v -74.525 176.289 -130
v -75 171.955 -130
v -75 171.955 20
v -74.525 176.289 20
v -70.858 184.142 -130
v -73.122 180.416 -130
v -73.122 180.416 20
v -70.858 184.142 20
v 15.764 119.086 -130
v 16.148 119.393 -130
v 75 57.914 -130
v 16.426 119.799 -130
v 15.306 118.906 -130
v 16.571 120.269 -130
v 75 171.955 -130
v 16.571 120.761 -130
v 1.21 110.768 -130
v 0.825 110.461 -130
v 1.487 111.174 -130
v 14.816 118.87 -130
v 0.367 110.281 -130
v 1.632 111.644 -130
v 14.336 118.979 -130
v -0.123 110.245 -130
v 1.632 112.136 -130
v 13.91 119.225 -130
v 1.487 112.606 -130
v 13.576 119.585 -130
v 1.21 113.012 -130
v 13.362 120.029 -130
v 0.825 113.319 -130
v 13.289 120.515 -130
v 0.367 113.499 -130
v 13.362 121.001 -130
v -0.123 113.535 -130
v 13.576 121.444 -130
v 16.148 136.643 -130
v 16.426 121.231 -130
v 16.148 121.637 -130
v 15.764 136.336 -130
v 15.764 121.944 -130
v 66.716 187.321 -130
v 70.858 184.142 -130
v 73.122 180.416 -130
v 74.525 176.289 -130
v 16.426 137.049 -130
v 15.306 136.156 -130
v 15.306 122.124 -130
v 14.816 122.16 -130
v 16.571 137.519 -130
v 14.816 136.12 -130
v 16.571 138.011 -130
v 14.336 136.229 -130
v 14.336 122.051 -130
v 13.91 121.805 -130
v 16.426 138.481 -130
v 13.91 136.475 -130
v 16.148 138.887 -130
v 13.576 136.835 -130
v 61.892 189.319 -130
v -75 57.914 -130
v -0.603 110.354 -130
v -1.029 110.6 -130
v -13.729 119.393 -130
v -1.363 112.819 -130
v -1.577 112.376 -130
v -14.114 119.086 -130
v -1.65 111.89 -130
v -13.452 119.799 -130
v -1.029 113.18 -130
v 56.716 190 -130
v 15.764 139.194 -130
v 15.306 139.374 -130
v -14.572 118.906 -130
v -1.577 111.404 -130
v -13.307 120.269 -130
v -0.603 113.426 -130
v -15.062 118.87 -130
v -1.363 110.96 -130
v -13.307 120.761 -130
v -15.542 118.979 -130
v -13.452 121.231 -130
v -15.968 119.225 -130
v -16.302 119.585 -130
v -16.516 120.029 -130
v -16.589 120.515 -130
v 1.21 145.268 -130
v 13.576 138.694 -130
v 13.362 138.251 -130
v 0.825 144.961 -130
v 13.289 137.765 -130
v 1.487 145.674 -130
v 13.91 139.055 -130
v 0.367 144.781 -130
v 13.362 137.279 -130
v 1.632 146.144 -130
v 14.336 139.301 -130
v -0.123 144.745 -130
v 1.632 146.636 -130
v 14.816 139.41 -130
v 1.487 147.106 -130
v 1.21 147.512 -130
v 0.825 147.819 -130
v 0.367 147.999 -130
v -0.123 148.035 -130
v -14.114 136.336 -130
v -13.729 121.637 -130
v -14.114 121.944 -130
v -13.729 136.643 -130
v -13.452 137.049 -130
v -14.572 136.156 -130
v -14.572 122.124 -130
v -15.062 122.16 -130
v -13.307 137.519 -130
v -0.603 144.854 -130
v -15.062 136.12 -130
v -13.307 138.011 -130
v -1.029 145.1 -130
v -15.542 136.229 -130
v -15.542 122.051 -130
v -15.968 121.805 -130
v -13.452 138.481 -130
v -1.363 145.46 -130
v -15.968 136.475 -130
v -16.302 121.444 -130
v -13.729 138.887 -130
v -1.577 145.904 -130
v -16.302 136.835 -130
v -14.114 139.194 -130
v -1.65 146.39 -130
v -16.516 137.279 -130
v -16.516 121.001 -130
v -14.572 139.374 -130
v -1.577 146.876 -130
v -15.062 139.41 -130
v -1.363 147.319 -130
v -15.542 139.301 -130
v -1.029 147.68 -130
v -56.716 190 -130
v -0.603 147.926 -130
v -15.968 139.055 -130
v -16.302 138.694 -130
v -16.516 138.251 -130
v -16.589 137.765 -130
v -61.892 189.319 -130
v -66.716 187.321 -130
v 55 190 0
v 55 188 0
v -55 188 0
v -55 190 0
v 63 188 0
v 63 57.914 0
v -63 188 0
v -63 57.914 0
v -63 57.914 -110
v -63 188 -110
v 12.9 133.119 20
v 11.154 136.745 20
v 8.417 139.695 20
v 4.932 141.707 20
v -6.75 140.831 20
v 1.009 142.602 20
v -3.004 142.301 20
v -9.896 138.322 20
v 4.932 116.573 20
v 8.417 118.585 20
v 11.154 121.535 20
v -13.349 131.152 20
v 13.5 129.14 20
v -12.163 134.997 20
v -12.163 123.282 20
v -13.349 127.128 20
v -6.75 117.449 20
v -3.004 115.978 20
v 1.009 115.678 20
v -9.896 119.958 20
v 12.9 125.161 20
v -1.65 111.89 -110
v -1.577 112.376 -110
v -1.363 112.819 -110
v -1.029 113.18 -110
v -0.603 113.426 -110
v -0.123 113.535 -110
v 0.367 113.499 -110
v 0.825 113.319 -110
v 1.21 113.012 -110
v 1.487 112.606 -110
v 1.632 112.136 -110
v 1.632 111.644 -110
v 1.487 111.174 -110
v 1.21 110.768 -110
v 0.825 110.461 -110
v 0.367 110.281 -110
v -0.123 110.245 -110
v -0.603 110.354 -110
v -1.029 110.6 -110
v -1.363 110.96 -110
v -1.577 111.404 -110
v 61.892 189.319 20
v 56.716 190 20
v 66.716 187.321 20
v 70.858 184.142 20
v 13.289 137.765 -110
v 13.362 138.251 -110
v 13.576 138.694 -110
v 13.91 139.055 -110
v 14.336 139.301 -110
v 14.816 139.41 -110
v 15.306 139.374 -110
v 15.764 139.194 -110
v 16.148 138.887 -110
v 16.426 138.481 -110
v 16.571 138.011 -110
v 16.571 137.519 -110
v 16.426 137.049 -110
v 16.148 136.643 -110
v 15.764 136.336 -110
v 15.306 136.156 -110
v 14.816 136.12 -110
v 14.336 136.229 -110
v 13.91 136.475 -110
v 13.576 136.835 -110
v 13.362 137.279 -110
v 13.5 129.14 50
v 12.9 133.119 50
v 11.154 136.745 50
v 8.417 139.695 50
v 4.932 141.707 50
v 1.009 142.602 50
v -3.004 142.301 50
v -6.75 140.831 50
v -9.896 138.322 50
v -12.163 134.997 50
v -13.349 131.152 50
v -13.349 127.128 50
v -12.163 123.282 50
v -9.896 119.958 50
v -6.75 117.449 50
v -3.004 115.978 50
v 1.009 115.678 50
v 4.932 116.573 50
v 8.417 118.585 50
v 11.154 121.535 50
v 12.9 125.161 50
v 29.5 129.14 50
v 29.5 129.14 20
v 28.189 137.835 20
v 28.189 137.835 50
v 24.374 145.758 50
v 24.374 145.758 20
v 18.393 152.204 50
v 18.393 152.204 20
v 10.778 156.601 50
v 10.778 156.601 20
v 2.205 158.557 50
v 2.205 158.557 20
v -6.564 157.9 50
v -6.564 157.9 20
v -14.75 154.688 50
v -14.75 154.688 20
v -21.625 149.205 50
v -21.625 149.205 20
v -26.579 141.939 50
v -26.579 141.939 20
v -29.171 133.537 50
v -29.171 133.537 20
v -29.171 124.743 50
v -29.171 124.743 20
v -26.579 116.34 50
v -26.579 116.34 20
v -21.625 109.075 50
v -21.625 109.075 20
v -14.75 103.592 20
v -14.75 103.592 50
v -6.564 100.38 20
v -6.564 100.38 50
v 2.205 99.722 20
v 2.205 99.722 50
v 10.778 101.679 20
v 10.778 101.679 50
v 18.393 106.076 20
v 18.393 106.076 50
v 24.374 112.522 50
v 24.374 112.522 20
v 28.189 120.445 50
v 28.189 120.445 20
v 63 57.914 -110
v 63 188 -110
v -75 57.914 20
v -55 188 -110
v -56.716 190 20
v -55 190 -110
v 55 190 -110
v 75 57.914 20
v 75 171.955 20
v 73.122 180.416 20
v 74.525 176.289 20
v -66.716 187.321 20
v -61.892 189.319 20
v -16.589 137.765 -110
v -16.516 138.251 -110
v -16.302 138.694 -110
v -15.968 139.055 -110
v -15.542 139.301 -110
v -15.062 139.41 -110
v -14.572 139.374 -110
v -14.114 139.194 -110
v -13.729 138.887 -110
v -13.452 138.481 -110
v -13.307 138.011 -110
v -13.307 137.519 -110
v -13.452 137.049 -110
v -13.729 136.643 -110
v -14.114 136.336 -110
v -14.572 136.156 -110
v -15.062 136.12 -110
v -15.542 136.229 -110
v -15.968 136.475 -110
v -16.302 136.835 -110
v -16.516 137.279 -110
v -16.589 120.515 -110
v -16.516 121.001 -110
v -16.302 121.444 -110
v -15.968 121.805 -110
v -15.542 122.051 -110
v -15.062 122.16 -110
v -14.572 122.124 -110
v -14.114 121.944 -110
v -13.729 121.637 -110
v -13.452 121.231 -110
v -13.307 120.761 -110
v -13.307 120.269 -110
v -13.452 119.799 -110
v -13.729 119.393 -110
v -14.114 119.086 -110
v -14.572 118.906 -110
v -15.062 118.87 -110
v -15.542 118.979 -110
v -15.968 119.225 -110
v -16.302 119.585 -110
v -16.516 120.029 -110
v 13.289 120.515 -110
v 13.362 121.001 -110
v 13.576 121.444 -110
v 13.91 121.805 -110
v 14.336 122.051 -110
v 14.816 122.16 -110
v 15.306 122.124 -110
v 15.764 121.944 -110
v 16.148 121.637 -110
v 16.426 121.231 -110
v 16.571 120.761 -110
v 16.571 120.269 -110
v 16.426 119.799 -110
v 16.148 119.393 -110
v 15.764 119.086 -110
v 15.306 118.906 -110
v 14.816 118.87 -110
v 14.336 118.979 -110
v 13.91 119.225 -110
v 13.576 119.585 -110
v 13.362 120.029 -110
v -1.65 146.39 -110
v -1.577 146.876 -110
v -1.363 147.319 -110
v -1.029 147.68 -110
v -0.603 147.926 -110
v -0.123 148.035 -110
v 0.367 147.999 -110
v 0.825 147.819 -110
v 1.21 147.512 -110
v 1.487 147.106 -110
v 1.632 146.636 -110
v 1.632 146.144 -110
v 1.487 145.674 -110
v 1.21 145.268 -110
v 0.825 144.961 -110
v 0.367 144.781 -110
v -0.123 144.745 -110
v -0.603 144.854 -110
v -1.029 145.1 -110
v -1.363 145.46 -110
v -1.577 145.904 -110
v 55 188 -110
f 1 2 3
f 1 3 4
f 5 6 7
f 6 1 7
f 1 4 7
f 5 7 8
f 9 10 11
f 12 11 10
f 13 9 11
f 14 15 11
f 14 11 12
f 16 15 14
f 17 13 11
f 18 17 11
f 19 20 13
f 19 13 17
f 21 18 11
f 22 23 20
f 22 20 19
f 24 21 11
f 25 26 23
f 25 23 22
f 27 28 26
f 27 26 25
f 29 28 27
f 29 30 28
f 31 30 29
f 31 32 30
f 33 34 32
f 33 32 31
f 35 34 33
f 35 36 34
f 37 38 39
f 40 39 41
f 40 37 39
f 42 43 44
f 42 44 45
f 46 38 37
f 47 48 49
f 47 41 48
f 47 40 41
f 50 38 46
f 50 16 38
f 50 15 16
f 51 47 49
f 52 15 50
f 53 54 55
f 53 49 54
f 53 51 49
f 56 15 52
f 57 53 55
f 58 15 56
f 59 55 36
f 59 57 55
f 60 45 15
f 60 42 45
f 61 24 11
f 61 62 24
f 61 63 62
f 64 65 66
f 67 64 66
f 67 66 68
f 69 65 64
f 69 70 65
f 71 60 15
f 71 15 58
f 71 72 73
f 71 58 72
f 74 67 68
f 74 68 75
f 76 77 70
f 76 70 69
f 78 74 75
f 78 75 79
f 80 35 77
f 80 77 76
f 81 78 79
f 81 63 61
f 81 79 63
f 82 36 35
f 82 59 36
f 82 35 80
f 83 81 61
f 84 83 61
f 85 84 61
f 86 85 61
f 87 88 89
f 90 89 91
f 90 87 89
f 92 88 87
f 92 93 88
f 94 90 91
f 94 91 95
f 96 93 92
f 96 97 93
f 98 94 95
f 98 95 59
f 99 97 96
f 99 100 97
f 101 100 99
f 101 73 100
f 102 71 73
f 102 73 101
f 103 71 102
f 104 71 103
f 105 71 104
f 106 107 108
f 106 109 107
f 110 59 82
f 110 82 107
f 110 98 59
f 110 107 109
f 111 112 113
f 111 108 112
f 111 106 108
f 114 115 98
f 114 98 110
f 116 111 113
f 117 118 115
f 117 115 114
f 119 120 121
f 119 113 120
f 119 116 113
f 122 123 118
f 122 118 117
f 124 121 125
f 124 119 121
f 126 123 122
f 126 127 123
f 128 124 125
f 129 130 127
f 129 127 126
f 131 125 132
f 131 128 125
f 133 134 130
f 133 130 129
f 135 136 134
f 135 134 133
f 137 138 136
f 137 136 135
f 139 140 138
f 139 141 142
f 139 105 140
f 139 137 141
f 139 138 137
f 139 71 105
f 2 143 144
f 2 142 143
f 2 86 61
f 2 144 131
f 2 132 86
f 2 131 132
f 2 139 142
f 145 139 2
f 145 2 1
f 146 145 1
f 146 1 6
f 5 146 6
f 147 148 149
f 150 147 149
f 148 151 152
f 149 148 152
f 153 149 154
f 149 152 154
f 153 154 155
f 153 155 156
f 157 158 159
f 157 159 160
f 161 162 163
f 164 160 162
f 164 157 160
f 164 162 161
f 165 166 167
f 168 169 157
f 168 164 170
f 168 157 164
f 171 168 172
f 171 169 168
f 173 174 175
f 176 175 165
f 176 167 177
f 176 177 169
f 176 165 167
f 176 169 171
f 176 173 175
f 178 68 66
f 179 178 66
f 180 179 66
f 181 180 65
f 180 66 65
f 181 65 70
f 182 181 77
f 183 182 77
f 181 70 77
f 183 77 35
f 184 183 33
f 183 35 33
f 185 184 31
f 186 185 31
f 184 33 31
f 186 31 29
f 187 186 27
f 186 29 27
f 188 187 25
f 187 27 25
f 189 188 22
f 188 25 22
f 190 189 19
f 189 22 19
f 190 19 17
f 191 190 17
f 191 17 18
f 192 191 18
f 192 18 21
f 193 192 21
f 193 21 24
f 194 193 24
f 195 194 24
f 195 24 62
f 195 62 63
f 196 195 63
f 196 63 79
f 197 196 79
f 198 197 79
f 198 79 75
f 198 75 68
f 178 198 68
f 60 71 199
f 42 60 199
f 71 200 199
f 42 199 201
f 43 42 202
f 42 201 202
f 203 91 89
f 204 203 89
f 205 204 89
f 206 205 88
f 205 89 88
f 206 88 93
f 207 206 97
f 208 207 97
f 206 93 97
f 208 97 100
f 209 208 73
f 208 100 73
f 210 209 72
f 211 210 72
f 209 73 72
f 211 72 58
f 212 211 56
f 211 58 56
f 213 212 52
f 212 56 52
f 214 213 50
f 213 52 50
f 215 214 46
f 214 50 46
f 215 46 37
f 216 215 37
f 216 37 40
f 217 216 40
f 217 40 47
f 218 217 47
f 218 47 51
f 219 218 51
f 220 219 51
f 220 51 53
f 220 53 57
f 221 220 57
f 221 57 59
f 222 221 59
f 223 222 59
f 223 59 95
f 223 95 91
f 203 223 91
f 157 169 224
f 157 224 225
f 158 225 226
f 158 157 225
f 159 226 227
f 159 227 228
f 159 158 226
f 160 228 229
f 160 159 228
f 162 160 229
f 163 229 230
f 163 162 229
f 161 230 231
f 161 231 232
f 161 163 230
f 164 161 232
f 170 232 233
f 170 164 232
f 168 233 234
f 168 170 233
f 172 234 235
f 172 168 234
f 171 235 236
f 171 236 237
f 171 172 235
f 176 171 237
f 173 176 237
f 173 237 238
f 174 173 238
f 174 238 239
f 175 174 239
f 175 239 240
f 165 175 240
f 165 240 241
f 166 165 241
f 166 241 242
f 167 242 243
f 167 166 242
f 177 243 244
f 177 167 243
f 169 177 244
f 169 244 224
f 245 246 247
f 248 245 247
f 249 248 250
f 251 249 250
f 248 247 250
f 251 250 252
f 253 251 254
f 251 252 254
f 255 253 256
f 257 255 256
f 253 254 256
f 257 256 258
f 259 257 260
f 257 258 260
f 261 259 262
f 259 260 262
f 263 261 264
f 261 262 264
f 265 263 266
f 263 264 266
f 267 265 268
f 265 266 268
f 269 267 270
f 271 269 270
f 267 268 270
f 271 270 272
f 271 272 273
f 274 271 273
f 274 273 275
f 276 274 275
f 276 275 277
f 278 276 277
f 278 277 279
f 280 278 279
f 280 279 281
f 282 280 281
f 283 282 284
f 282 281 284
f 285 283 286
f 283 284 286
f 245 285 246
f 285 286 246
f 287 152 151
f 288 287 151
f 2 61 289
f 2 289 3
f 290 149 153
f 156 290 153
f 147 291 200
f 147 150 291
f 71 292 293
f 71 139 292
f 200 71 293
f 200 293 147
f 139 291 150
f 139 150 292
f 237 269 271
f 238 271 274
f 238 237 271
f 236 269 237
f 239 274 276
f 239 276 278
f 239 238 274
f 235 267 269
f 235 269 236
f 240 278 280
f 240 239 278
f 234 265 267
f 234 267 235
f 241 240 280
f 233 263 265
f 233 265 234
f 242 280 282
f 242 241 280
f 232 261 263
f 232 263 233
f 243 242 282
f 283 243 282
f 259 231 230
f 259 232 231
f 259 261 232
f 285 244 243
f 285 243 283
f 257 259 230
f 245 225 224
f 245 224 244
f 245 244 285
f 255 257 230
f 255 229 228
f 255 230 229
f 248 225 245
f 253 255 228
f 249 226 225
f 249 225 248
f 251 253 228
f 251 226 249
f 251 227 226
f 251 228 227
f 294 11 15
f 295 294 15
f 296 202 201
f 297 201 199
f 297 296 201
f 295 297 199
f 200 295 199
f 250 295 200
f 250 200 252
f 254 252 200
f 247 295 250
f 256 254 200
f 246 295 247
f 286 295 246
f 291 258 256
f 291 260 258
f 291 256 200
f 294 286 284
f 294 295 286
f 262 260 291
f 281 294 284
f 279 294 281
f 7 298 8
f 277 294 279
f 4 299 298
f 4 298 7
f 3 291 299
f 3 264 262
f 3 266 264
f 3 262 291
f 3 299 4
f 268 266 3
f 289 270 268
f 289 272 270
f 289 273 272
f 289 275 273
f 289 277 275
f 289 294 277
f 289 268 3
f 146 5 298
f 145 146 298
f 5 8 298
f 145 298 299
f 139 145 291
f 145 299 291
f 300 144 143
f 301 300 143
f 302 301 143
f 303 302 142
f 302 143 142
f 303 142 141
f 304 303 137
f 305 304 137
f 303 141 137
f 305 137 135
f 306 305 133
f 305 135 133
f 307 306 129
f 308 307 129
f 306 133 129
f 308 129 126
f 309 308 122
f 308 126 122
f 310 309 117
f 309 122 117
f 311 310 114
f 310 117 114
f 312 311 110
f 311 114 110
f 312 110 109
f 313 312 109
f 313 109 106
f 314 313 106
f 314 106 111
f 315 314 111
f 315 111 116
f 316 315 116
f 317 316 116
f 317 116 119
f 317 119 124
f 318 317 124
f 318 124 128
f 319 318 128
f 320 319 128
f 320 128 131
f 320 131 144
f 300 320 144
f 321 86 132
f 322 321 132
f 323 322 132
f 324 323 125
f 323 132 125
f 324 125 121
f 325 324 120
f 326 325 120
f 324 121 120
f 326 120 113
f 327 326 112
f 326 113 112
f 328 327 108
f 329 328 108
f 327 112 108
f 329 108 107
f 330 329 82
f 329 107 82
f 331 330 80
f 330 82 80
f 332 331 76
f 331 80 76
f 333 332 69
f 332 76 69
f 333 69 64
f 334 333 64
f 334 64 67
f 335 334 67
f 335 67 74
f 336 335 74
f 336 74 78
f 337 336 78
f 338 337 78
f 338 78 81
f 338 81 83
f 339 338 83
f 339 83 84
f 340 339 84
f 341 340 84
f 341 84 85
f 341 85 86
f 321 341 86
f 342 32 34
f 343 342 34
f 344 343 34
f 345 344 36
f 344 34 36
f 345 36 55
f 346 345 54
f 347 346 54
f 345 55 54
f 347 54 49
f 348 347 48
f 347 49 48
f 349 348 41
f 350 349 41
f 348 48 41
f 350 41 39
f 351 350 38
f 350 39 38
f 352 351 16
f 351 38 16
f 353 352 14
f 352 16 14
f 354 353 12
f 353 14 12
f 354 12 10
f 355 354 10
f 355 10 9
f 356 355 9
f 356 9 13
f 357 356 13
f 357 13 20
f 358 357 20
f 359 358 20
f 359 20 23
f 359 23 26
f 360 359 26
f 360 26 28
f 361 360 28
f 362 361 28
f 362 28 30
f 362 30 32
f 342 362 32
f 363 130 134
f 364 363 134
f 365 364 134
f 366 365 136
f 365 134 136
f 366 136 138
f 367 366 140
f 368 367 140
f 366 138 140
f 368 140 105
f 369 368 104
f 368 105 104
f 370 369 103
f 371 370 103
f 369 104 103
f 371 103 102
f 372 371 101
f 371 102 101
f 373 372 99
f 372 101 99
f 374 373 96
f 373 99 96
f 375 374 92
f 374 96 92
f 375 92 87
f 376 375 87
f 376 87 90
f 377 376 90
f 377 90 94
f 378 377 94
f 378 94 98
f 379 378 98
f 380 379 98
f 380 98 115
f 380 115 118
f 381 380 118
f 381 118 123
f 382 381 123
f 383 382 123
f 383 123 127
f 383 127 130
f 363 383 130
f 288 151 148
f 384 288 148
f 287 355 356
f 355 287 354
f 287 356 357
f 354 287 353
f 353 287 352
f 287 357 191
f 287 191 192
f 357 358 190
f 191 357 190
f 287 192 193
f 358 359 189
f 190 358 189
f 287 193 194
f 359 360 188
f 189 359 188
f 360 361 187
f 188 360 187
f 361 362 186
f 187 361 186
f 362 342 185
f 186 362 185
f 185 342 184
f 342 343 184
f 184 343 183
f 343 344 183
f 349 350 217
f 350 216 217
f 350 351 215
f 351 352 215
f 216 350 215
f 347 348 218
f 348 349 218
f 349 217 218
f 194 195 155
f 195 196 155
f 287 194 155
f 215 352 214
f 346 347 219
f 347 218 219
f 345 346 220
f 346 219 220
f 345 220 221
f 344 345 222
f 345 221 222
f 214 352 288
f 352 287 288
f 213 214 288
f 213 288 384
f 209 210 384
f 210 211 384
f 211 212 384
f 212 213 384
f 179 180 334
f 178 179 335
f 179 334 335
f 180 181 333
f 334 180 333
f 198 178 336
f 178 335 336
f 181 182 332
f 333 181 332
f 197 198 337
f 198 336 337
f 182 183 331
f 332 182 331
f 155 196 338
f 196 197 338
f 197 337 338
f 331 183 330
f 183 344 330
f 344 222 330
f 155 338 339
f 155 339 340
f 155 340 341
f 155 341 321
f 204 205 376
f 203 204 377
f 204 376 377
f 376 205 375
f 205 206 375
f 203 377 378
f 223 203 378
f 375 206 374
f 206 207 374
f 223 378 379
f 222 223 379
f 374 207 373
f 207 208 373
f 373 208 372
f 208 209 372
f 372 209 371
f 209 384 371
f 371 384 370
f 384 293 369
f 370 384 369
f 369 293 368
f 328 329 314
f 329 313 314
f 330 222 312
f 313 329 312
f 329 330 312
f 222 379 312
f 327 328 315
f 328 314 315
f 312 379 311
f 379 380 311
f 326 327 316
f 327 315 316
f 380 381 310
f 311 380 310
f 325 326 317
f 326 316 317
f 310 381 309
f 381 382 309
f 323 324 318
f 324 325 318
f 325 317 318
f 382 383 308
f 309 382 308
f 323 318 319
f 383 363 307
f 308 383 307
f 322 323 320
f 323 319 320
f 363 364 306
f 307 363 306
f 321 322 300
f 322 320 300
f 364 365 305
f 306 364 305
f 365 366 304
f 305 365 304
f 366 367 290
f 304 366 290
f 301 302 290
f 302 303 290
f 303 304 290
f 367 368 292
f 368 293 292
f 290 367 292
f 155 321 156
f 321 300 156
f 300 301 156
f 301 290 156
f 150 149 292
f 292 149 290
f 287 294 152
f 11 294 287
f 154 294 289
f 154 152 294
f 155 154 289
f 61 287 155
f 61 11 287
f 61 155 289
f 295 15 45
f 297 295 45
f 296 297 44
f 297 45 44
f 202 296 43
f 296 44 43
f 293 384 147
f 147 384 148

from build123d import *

# Parameters (mm, degrees)
EXTRUDE_1_OUTLINE_W             = 150
EXTRUDE_1_OUTLINE_H             = 400
EXTRUDE_1_OUTLINE_R             = 48.25
EXTRUDE_1_DEPTH                 = 20
SKETCH_2_W                      = 150
SKETCH_2_H                      = 400
SKETCH_2_W_2                    = 126
SKETCH_2_H_2                    = 376
EXTRUDE_1_2_DEPTH               = 110
EXTRUDE_START                   = 20
SKETCH_3_W                      = 150
SKETCH_3_H                      = 400
SKETCH_3_R                      = 48.25
EXTRUDE_3_DEPTH                 = 20
SKETCH_4_W                      = 110
SKETCH_4_H                      = 55
CUT_EXTRUDE_1_DEPTH             = 428.229446551
CHAMFER_2_SIZE                  = 20
CHAMFER_3_SIZE                  = 20
CUT_EXTRUDE_START               = 190
CUT_EXTRUDE_2_OUTLINE_W         = 132
CUT_EXTRUDE_2_OUTLINE_H         = 152
CUT_EXTRUDE_2_DEPTH             = 10
FILLET_1_R                      = 20
FILLET_2_R                      = 20
FILLET_3_R                      = 20
FILLET_4_R                      = 20
EXTRUDE_START_2                 = -20
SKETCH_6_R                      = 48.25
SKETCH_6_R_2                    = 29.5
EXTRUDE_4_DEPTH                 = 20
SKETCH_7_R                      = 48.25
SKETCH_7_R_2                    = 29.5
EXTRUDE_5_DEPTH                 = 20
SKETCH_8_R                      = 29.5
EXTRUDE_7_DEPTH                 = 20
SKETCH_9_R                      = 29.5
EXTRUDE_8_DEPTH                 = 20
SKETCH_10_R                     = 1.65
EXTRUDE_9_DEPTH                 = 10
EXTRUDE_START_3                 = 10
SKETCH_11_R                     = 1.65
EXTRUDE_10_DEPTH                = 10
SKETCH_12_W                     = 110
SKETCH_12_H                     = 147.914448675
CUT_EXTRUDE_3_DEPTH             = 287.530975638
CHAMFER_4_SIZE                  = 10
CHAMFER_5_SIZE                  = 10
SKETCH_13_W                     = 150
SKETCH_13_H                     = 80
CUT_EXTRUDE_4_DEPTH             = 267.880122902
SKETCH_15_R                     = 29.5
SKETCH_15_R_2                   = 13.5
EXTRUDE_11_DEPTH                = 30
CUT_EXTRUDE_5_REACH             = 274.259
SKETCH_16_R                     = 1.65
CUT_EXTRUDE_5_DIRECTION_2_DEPTH = 273.259067801


with BuildPart() as part:
    # Extrude 1: read off the stored shape, not the designer's step
    # Extrude 1 outline → Extrude 1 (new body)
    with BuildSketch(Plane.XY):
        Rectangle(EXTRUDE_1_OUTLINE_W, EXTRUDE_1_OUTLINE_H)
        with Locations((2.655190842, -130.335551325)):
            Circle(EXTRUDE_1_OUTLINE_R, mode=Mode.SUBTRACT)
        with Locations((0, 129.13990983)):
            Circle(EXTRUDE_1_OUTLINE_R, mode=Mode.SUBTRACT)
    extrude(amount=EXTRUDE_1_DEPTH)

    # 草图2 → Extrude 1 2 (add)
    with BuildSketch(Plane(origin=(0, 0, 0), x_dir=(-1, 0, 0), z_dir=(0, 0, -1))):
        Rectangle(SKETCH_2_W, SKETCH_2_H)
        Rectangle(SKETCH_2_W_2, SKETCH_2_H_2, mode=Mode.SUBTRACT)
    extrude(amount=EXTRUDE_1_2_DEPTH)

    # 草图3 → 凸台-拉伸3 (add)
    with BuildSketch(Plane(origin=(0, 0, -110), x_dir=(-1, 0, 0), z_dir=(0, 0, -1)).offset(EXTRUDE_START)):
        Rectangle(SKETCH_3_W, SKETCH_3_H)
        with Locations(Location((-2.655190842, -130.335551325, 0), (0, 0, 180))):
            Circle(SKETCH_3_R, mode=Mode.SUBTRACT)
        with Locations(Location((0, 129.13990983, 0), (0, 0, 180))):
            Circle(SKETCH_3_R, mode=Mode.SUBTRACT)
    extrude(amount=-EXTRUDE_3_DEPTH)

    # 草图4 → 切除-拉伸1 (cut, through all)
    with BuildSketch(Plane.XZ.offset(200)):
        with Locations((0, -27.5)):
            Rectangle(SKETCH_4_W, SKETCH_4_H)
        with Locations((0, -82.5)):
            Rectangle(SKETCH_4_W, SKETCH_4_H)
    extrude(amount=-CUT_EXTRUDE_1_DEPTH, mode=Mode.SUBTRACT)

    # 倒角2
    chamfer_2_edges = [part.edges().sort_by_distance(p)[0] for p in [
        (-75, 200, -55),
    ]]
    chamfer(chamfer_2_edges, length=CHAMFER_2_SIZE - 0.0001)  # a hair under: the kernel refuses the full size

    # 倒角3
    chamfer_3_edges = [part.edges().sort_by_distance(p)[0] for p in [
        (75, 200, -55),
    ]]
    chamfer(chamfer_3_edges, length=CHAMFER_3_SIZE - 0.0001)  # a hair under: the kernel refuses the full size

    # 切除-拉伸2: read off the stored shape, not the designer's step
    # 切除-拉伸2 outline → 切除-拉伸2 (cut)
    with BuildSketch(Plane(origin=(0, 0, 0), x_dir=(1, 0, 0), z_dir=(0, 1, 0)).offset(CUT_EXTRUDE_START)):
        with Locations((0, 55)):
            Rectangle(CUT_EXTRUDE_2_OUTLINE_W, CUT_EXTRUDE_2_OUTLINE_H)
    extrude(amount=CUT_EXTRUDE_2_DEPTH, mode=Mode.SUBTRACT)

    # 圆角1
    fillet_1_edges = [part.edges().sort_by_distance(p)[0] for p in [
        (-65.0001, 190, -55),
    ]]
    fillet(fillet_1_edges, radius=FILLET_1_R)

    # 圆角2
    fillet_2_edges = [part.edges().sort_by_distance(p)[0] for p in [
        (65.0001, 190, -55),
    ]]
    fillet(fillet_2_edges, radius=FILLET_2_R)

    # 圆角3
    # the kernel refuses this fillet: 20 mm, written as the material it takes off along each edge
    with BuildSketch(Plane(origin=(-75, 180.0001, 40.112615753), x_dir=(0.7071067811865488, 0.7071067811865464, 0), z_dir=(0, 0, -1))) as fillet_3_piece_1:
        with BuildLine():
            CenterArc((8.453428829, 19.830842418), FILLET_3_R, 225, 37.542814558)
            Line((-5.688706794, 5.688706794), (-5.971549507, 5.405864082))
            Line((-5.971549507, 5.405864082), (-0.282842712, -0.282842712))
            Line((-0.282842712, -0.282842712), (0, -0.4))
            ThreePointArc((0, -0.4), (2.928861477, -0.4), (5.805808837, -0.396616848))
            Line((5.805808837, -0.396616848), (5.857722955, 0))
        make_face()
    extrude(amount=190.225231505, mode=Mode.SUBTRACT)

    # 圆角4
    # the kernel refuses this fillet: 20 mm, written as the material it takes off along each edge
    with BuildSketch(Plane(origin=(75, 180.0001, -150.112615753), x_dir=(-0.7071067811865438, 0.7071067811865511, 0), z_dir=(0, 0, 1))) as fillet_4_piece_1:
        with BuildLine():
            CenterArc((8.453428829, 19.830842418), FILLET_4_R, 225, 37.542814558)
            Line((-5.688706794, 5.688706794), (-5.971549507, 5.405864082))
            Line((-5.971549507, 5.405864082), (-0.282842712, -0.282842712))
            Line((-0.282842712, -0.282842712), (0, -0.4))
            ThreePointArc((0, -0.4), (2.928861477, -0.4), (5.805808837, -0.396616848))
            Line((5.805808837, -0.396616848), (5.857722955, 0))
        make_face()
    extrude(amount=190.225231505, mode=Mode.SUBTRACT)

    # 草图6 → 凸台-拉伸4 (add)
    with BuildSketch(Plane.XY.offset(20).offset(EXTRUDE_START_2)):
        with Locations(Location((0, 129.13990983, 0), (0, 0, 180))):
            Circle(SKETCH_6_R)
        with Locations((0, 129.13990983)):
            Circle(SKETCH_6_R_2, mode=Mode.SUBTRACT)
    extrude(amount=EXTRUDE_4_DEPTH)

    # 草图7 → 凸台-拉伸5 (add)
    with BuildSketch(Plane(origin=(0, 0, -130), x_dir=(-1, 0, 0), z_dir=(0, 0, -1))):
        with Locations((0, 129.13990983)):
            Circle(SKETCH_7_R)
        with Locations(Location((0, 129.13990983, 0), (0, 0, 180))):
            Circle(SKETCH_7_R_2, mode=Mode.SUBTRACT)
    extrude(amount=-EXTRUDE_5_DEPTH)

    # 草图8 → 凸台-拉伸7 (add)
    with BuildSketch(Plane.XY.offset(20).offset(EXTRUDE_START_2)):
        with Locations(Location((0, 129.13990983, 0), (0, 0, 180))):
            Circle(SKETCH_8_R)
    extrude(amount=EXTRUDE_7_DEPTH)

    # 草图9 → 凸台-拉伸8 (add)
    with BuildSketch(Plane(origin=(0, 0, -130), x_dir=(-1, 0, 0), z_dir=(0, 0, -1))):
        with Locations((0, 129.13990983)):
            Circle(SKETCH_9_R)
    extrude(amount=-EXTRUDE_8_DEPTH)

    # 草图10 → 凸台-拉伸9 (add)
    with BuildSketch(Plane(origin=(0, 0, -130), x_dir=(-1, 0, 0), z_dir=(0, 0, -1))):
        with Locations((0, 146.38990983)):
            Circle(SKETCH_10_R)
        with Locations((14.938938215, 137.76490983)):
            Circle(SKETCH_10_R)
        with Locations((14.938938215, 120.51490983)):
            Circle(SKETCH_10_R)
        with Locations((0, 111.88990983)):
            Circle(SKETCH_10_R)
        with Locations((-14.938938215, 120.51490983)):
            Circle(SKETCH_10_R)
        with Locations((-14.938938215, 137.76490983)):
            Circle(SKETCH_10_R)
    extrude(amount=EXTRUDE_9_DEPTH)

    # 草图11 → 凸台-拉伸10 (add)
    with BuildSketch(Plane.XY.offset(20).offset(EXTRUDE_START_3)):
        with Locations(Location((-14.938938215, 137.76490983, 0), (0, 0, 180))):
            Circle(SKETCH_11_R)
        with Locations(Location((-14.938938215, 120.51490983, 0), (0, 0, 180))):
            Circle(SKETCH_11_R)
        with Locations(Location((0, 111.88990983, 0), (0, 0, 180))):
            Circle(SKETCH_11_R)
        with Locations(Location((14.938938215, 120.51490983, 0), (0, 0, 180))):
            Circle(SKETCH_11_R)
        with Locations(Location((0, 146.38990983, 0), (0, 0, 180))):
            Circle(SKETCH_11_R)
        with Locations(Location((14.938938215, 137.76490983, 0), (0, 0, 180))):
            Circle(SKETCH_11_R)
    extrude(amount=-EXTRUDE_10_DEPTH)

    # 草图12 → 切除-拉伸3 (cut, through all)
    with BuildSketch(Plane.ZY.offset(75)):
        with Locations((-55, -126.042775663)):
            Rectangle(SKETCH_12_W, SKETCH_12_H)
    extrude(amount=-CUT_EXTRUDE_3_DEPTH, mode=Mode.SUBTRACT)

    # 倒角4
    chamfer_4_edges = [part.edges().sort_by_distance(p)[0] for p in [
        (-75, -200, -120),
    ]]
    chamfer(chamfer_4_edges, length=CHAMFER_4_SIZE)

    # 倒角5
    chamfer_5_edges = [part.edges().sort_by_distance(p)[0] for p in [
        (75, -200, -120),
        (-75, -200, 10),
        (75, -200, 10),
    ]]
    chamfer(chamfer_5_edges, length=CHAMFER_5_SIZE)

    # 草图13 → 切除-拉伸4 (cut, through all)
    with BuildSketch(Plane(origin=(0, 0, -130), x_dir=(-1, 0, 0), z_dir=(0, 0, -1))):
        with Locations((0, 17.914448675)):
            Rectangle(SKETCH_13_W, SKETCH_13_H)
    extrude(amount=-CUT_EXTRUDE_4_DEPTH, mode=Mode.SUBTRACT)


with BuildPart() as body_2:
    # of the pieces the cut leaves, the one that is kept (cut_extrude_4_keep)
    add(part.part.solids().sort_by_distance((63, 188, -110))[0])

    # 草图15 → 凸台-拉伸11 (add)
    with BuildSketch(Plane.XY.offset(20)):
        with Locations((0, 129.13990983)):
            Circle(SKETCH_15_R)
        with Locations((0, 129.13990983)):
            Circle(SKETCH_15_R_2, mode=Mode.SUBTRACT)
    extrude(amount=EXTRUDE_11_DEPTH)

    # 草图16 → 切除-拉伸5 (cut, up to next)
    with BuildSketch(Plane(origin=(0, 0, -130), x_dir=(-1, 0, 0), z_dir=(0, 0, -1)), mode=Mode.PRIVATE) as cut_extrude_5_sk1:
        with Locations((-14.938938215, 137.76490983)):
            Circle(SKETCH_16_R)
    cut_extrude_5_tool1 = extrude(cut_extrude_5_sk1.sketch, amount=-CUT_EXTRUDE_5_REACH, mode=Mode.PRIVATE) & body_2.part
    # 草图16 → 切除-拉伸5 (cut, up to next)
    with BuildSketch(Plane(origin=(0, 0, -130), x_dir=(-1, 0, 0), z_dir=(0, 0, -1)), mode=Mode.PRIVATE) as cut_extrude_5_sk2:
        with Locations((0, 146.38990983)):
            Circle(SKETCH_16_R)
    cut_extrude_5_tool2 = extrude(cut_extrude_5_sk2.sketch, amount=-CUT_EXTRUDE_5_REACH, mode=Mode.PRIVATE) & body_2.part
    # 草图16 → 切除-拉伸5 (cut, up to next)
    with BuildSketch(Plane(origin=(0, 0, -130), x_dir=(-1, 0, 0), z_dir=(0, 0, -1)), mode=Mode.PRIVATE) as cut_extrude_5_sk3:
        with Locations((14.938938215, 137.76490983)):
            Circle(SKETCH_16_R)
    cut_extrude_5_tool3 = extrude(cut_extrude_5_sk3.sketch, amount=-CUT_EXTRUDE_5_REACH, mode=Mode.PRIVATE) & body_2.part
    # 草图16 → 切除-拉伸5 (cut, up to next)
    with BuildSketch(Plane(origin=(0, 0, -130), x_dir=(-1, 0, 0), z_dir=(0, 0, -1)), mode=Mode.PRIVATE) as cut_extrude_5_sk4:
        with Locations((14.938938215, 120.51490983)):
            Circle(SKETCH_16_R)
    cut_extrude_5_tool4 = extrude(cut_extrude_5_sk4.sketch, amount=-CUT_EXTRUDE_5_REACH, mode=Mode.PRIVATE) & body_2.part
    # 草图16 → 切除-拉伸5 (cut, up to next)
    with BuildSketch(Plane(origin=(0, 0, -130), x_dir=(-1, 0, 0), z_dir=(0, 0, -1)), mode=Mode.PRIVATE) as cut_extrude_5_sk5:
        with Locations((0, 111.88990983)):
            Circle(SKETCH_16_R)
    cut_extrude_5_tool5 = extrude(cut_extrude_5_sk5.sketch, amount=-CUT_EXTRUDE_5_REACH, mode=Mode.PRIVATE) & body_2.part
    # 草图16 → 切除-拉伸5 (cut, up to next)
    with BuildSketch(Plane(origin=(0, 0, -130), x_dir=(-1, 0, 0), z_dir=(0, 0, -1)), mode=Mode.PRIVATE) as cut_extrude_5_sk6:
        with Locations((-14.938938215, 120.51490983)):
            Circle(SKETCH_16_R)
    cut_extrude_5_tool6 = extrude(cut_extrude_5_sk6.sketch, amount=-CUT_EXTRUDE_5_REACH, mode=Mode.PRIVATE) & body_2.part
    add(cut_extrude_5_tool1.solids().sort_by_distance((14.938938, 137.76491, -130))[0], mode=Mode.SUBTRACT)
    add(cut_extrude_5_tool2.solids().sort_by_distance((0, 146.38991, -130))[0], mode=Mode.SUBTRACT)
    add(cut_extrude_5_tool3.solids().sort_by_distance((-14.938938, 137.76491, -130))[0], mode=Mode.SUBTRACT)
    add(cut_extrude_5_tool4.solids().sort_by_distance((-14.938938, 120.51491, -130))[0], mode=Mode.SUBTRACT)
    add(cut_extrude_5_tool5.solids().sort_by_distance((0, 111.88991, -130))[0], mode=Mode.SUBTRACT)
    add(cut_extrude_5_tool6.solids().sort_by_distance((14.938938, 120.51491, -130))[0], mode=Mode.SUBTRACT)

    # 草图16 → 切除-拉伸5 direction 2 (cut)
    with BuildSketch(Plane(origin=(0, 0, -130), x_dir=(-1, 0, 0), z_dir=(0, 0, -1))):
        with Locations((-14.938938215, 137.76490983)):
            Circle(SKETCH_16_R)
        with Locations((0, 146.38990983)):
            Circle(SKETCH_16_R)
        with Locations((14.938938215, 137.76490983)):
            Circle(SKETCH_16_R)
        with Locations((14.938938215, 120.51490983)):
            Circle(SKETCH_16_R)
        with Locations((0, 111.88990983)):
            Circle(SKETCH_16_R)
        with Locations((-14.938938215, 120.51490983)):
            Circle(SKETCH_16_R)
    extrude(amount=CUT_EXTRUDE_5_DIRECTION_2_DEPTH, mode=Mode.SUBTRACT)


solid = body_2.part
